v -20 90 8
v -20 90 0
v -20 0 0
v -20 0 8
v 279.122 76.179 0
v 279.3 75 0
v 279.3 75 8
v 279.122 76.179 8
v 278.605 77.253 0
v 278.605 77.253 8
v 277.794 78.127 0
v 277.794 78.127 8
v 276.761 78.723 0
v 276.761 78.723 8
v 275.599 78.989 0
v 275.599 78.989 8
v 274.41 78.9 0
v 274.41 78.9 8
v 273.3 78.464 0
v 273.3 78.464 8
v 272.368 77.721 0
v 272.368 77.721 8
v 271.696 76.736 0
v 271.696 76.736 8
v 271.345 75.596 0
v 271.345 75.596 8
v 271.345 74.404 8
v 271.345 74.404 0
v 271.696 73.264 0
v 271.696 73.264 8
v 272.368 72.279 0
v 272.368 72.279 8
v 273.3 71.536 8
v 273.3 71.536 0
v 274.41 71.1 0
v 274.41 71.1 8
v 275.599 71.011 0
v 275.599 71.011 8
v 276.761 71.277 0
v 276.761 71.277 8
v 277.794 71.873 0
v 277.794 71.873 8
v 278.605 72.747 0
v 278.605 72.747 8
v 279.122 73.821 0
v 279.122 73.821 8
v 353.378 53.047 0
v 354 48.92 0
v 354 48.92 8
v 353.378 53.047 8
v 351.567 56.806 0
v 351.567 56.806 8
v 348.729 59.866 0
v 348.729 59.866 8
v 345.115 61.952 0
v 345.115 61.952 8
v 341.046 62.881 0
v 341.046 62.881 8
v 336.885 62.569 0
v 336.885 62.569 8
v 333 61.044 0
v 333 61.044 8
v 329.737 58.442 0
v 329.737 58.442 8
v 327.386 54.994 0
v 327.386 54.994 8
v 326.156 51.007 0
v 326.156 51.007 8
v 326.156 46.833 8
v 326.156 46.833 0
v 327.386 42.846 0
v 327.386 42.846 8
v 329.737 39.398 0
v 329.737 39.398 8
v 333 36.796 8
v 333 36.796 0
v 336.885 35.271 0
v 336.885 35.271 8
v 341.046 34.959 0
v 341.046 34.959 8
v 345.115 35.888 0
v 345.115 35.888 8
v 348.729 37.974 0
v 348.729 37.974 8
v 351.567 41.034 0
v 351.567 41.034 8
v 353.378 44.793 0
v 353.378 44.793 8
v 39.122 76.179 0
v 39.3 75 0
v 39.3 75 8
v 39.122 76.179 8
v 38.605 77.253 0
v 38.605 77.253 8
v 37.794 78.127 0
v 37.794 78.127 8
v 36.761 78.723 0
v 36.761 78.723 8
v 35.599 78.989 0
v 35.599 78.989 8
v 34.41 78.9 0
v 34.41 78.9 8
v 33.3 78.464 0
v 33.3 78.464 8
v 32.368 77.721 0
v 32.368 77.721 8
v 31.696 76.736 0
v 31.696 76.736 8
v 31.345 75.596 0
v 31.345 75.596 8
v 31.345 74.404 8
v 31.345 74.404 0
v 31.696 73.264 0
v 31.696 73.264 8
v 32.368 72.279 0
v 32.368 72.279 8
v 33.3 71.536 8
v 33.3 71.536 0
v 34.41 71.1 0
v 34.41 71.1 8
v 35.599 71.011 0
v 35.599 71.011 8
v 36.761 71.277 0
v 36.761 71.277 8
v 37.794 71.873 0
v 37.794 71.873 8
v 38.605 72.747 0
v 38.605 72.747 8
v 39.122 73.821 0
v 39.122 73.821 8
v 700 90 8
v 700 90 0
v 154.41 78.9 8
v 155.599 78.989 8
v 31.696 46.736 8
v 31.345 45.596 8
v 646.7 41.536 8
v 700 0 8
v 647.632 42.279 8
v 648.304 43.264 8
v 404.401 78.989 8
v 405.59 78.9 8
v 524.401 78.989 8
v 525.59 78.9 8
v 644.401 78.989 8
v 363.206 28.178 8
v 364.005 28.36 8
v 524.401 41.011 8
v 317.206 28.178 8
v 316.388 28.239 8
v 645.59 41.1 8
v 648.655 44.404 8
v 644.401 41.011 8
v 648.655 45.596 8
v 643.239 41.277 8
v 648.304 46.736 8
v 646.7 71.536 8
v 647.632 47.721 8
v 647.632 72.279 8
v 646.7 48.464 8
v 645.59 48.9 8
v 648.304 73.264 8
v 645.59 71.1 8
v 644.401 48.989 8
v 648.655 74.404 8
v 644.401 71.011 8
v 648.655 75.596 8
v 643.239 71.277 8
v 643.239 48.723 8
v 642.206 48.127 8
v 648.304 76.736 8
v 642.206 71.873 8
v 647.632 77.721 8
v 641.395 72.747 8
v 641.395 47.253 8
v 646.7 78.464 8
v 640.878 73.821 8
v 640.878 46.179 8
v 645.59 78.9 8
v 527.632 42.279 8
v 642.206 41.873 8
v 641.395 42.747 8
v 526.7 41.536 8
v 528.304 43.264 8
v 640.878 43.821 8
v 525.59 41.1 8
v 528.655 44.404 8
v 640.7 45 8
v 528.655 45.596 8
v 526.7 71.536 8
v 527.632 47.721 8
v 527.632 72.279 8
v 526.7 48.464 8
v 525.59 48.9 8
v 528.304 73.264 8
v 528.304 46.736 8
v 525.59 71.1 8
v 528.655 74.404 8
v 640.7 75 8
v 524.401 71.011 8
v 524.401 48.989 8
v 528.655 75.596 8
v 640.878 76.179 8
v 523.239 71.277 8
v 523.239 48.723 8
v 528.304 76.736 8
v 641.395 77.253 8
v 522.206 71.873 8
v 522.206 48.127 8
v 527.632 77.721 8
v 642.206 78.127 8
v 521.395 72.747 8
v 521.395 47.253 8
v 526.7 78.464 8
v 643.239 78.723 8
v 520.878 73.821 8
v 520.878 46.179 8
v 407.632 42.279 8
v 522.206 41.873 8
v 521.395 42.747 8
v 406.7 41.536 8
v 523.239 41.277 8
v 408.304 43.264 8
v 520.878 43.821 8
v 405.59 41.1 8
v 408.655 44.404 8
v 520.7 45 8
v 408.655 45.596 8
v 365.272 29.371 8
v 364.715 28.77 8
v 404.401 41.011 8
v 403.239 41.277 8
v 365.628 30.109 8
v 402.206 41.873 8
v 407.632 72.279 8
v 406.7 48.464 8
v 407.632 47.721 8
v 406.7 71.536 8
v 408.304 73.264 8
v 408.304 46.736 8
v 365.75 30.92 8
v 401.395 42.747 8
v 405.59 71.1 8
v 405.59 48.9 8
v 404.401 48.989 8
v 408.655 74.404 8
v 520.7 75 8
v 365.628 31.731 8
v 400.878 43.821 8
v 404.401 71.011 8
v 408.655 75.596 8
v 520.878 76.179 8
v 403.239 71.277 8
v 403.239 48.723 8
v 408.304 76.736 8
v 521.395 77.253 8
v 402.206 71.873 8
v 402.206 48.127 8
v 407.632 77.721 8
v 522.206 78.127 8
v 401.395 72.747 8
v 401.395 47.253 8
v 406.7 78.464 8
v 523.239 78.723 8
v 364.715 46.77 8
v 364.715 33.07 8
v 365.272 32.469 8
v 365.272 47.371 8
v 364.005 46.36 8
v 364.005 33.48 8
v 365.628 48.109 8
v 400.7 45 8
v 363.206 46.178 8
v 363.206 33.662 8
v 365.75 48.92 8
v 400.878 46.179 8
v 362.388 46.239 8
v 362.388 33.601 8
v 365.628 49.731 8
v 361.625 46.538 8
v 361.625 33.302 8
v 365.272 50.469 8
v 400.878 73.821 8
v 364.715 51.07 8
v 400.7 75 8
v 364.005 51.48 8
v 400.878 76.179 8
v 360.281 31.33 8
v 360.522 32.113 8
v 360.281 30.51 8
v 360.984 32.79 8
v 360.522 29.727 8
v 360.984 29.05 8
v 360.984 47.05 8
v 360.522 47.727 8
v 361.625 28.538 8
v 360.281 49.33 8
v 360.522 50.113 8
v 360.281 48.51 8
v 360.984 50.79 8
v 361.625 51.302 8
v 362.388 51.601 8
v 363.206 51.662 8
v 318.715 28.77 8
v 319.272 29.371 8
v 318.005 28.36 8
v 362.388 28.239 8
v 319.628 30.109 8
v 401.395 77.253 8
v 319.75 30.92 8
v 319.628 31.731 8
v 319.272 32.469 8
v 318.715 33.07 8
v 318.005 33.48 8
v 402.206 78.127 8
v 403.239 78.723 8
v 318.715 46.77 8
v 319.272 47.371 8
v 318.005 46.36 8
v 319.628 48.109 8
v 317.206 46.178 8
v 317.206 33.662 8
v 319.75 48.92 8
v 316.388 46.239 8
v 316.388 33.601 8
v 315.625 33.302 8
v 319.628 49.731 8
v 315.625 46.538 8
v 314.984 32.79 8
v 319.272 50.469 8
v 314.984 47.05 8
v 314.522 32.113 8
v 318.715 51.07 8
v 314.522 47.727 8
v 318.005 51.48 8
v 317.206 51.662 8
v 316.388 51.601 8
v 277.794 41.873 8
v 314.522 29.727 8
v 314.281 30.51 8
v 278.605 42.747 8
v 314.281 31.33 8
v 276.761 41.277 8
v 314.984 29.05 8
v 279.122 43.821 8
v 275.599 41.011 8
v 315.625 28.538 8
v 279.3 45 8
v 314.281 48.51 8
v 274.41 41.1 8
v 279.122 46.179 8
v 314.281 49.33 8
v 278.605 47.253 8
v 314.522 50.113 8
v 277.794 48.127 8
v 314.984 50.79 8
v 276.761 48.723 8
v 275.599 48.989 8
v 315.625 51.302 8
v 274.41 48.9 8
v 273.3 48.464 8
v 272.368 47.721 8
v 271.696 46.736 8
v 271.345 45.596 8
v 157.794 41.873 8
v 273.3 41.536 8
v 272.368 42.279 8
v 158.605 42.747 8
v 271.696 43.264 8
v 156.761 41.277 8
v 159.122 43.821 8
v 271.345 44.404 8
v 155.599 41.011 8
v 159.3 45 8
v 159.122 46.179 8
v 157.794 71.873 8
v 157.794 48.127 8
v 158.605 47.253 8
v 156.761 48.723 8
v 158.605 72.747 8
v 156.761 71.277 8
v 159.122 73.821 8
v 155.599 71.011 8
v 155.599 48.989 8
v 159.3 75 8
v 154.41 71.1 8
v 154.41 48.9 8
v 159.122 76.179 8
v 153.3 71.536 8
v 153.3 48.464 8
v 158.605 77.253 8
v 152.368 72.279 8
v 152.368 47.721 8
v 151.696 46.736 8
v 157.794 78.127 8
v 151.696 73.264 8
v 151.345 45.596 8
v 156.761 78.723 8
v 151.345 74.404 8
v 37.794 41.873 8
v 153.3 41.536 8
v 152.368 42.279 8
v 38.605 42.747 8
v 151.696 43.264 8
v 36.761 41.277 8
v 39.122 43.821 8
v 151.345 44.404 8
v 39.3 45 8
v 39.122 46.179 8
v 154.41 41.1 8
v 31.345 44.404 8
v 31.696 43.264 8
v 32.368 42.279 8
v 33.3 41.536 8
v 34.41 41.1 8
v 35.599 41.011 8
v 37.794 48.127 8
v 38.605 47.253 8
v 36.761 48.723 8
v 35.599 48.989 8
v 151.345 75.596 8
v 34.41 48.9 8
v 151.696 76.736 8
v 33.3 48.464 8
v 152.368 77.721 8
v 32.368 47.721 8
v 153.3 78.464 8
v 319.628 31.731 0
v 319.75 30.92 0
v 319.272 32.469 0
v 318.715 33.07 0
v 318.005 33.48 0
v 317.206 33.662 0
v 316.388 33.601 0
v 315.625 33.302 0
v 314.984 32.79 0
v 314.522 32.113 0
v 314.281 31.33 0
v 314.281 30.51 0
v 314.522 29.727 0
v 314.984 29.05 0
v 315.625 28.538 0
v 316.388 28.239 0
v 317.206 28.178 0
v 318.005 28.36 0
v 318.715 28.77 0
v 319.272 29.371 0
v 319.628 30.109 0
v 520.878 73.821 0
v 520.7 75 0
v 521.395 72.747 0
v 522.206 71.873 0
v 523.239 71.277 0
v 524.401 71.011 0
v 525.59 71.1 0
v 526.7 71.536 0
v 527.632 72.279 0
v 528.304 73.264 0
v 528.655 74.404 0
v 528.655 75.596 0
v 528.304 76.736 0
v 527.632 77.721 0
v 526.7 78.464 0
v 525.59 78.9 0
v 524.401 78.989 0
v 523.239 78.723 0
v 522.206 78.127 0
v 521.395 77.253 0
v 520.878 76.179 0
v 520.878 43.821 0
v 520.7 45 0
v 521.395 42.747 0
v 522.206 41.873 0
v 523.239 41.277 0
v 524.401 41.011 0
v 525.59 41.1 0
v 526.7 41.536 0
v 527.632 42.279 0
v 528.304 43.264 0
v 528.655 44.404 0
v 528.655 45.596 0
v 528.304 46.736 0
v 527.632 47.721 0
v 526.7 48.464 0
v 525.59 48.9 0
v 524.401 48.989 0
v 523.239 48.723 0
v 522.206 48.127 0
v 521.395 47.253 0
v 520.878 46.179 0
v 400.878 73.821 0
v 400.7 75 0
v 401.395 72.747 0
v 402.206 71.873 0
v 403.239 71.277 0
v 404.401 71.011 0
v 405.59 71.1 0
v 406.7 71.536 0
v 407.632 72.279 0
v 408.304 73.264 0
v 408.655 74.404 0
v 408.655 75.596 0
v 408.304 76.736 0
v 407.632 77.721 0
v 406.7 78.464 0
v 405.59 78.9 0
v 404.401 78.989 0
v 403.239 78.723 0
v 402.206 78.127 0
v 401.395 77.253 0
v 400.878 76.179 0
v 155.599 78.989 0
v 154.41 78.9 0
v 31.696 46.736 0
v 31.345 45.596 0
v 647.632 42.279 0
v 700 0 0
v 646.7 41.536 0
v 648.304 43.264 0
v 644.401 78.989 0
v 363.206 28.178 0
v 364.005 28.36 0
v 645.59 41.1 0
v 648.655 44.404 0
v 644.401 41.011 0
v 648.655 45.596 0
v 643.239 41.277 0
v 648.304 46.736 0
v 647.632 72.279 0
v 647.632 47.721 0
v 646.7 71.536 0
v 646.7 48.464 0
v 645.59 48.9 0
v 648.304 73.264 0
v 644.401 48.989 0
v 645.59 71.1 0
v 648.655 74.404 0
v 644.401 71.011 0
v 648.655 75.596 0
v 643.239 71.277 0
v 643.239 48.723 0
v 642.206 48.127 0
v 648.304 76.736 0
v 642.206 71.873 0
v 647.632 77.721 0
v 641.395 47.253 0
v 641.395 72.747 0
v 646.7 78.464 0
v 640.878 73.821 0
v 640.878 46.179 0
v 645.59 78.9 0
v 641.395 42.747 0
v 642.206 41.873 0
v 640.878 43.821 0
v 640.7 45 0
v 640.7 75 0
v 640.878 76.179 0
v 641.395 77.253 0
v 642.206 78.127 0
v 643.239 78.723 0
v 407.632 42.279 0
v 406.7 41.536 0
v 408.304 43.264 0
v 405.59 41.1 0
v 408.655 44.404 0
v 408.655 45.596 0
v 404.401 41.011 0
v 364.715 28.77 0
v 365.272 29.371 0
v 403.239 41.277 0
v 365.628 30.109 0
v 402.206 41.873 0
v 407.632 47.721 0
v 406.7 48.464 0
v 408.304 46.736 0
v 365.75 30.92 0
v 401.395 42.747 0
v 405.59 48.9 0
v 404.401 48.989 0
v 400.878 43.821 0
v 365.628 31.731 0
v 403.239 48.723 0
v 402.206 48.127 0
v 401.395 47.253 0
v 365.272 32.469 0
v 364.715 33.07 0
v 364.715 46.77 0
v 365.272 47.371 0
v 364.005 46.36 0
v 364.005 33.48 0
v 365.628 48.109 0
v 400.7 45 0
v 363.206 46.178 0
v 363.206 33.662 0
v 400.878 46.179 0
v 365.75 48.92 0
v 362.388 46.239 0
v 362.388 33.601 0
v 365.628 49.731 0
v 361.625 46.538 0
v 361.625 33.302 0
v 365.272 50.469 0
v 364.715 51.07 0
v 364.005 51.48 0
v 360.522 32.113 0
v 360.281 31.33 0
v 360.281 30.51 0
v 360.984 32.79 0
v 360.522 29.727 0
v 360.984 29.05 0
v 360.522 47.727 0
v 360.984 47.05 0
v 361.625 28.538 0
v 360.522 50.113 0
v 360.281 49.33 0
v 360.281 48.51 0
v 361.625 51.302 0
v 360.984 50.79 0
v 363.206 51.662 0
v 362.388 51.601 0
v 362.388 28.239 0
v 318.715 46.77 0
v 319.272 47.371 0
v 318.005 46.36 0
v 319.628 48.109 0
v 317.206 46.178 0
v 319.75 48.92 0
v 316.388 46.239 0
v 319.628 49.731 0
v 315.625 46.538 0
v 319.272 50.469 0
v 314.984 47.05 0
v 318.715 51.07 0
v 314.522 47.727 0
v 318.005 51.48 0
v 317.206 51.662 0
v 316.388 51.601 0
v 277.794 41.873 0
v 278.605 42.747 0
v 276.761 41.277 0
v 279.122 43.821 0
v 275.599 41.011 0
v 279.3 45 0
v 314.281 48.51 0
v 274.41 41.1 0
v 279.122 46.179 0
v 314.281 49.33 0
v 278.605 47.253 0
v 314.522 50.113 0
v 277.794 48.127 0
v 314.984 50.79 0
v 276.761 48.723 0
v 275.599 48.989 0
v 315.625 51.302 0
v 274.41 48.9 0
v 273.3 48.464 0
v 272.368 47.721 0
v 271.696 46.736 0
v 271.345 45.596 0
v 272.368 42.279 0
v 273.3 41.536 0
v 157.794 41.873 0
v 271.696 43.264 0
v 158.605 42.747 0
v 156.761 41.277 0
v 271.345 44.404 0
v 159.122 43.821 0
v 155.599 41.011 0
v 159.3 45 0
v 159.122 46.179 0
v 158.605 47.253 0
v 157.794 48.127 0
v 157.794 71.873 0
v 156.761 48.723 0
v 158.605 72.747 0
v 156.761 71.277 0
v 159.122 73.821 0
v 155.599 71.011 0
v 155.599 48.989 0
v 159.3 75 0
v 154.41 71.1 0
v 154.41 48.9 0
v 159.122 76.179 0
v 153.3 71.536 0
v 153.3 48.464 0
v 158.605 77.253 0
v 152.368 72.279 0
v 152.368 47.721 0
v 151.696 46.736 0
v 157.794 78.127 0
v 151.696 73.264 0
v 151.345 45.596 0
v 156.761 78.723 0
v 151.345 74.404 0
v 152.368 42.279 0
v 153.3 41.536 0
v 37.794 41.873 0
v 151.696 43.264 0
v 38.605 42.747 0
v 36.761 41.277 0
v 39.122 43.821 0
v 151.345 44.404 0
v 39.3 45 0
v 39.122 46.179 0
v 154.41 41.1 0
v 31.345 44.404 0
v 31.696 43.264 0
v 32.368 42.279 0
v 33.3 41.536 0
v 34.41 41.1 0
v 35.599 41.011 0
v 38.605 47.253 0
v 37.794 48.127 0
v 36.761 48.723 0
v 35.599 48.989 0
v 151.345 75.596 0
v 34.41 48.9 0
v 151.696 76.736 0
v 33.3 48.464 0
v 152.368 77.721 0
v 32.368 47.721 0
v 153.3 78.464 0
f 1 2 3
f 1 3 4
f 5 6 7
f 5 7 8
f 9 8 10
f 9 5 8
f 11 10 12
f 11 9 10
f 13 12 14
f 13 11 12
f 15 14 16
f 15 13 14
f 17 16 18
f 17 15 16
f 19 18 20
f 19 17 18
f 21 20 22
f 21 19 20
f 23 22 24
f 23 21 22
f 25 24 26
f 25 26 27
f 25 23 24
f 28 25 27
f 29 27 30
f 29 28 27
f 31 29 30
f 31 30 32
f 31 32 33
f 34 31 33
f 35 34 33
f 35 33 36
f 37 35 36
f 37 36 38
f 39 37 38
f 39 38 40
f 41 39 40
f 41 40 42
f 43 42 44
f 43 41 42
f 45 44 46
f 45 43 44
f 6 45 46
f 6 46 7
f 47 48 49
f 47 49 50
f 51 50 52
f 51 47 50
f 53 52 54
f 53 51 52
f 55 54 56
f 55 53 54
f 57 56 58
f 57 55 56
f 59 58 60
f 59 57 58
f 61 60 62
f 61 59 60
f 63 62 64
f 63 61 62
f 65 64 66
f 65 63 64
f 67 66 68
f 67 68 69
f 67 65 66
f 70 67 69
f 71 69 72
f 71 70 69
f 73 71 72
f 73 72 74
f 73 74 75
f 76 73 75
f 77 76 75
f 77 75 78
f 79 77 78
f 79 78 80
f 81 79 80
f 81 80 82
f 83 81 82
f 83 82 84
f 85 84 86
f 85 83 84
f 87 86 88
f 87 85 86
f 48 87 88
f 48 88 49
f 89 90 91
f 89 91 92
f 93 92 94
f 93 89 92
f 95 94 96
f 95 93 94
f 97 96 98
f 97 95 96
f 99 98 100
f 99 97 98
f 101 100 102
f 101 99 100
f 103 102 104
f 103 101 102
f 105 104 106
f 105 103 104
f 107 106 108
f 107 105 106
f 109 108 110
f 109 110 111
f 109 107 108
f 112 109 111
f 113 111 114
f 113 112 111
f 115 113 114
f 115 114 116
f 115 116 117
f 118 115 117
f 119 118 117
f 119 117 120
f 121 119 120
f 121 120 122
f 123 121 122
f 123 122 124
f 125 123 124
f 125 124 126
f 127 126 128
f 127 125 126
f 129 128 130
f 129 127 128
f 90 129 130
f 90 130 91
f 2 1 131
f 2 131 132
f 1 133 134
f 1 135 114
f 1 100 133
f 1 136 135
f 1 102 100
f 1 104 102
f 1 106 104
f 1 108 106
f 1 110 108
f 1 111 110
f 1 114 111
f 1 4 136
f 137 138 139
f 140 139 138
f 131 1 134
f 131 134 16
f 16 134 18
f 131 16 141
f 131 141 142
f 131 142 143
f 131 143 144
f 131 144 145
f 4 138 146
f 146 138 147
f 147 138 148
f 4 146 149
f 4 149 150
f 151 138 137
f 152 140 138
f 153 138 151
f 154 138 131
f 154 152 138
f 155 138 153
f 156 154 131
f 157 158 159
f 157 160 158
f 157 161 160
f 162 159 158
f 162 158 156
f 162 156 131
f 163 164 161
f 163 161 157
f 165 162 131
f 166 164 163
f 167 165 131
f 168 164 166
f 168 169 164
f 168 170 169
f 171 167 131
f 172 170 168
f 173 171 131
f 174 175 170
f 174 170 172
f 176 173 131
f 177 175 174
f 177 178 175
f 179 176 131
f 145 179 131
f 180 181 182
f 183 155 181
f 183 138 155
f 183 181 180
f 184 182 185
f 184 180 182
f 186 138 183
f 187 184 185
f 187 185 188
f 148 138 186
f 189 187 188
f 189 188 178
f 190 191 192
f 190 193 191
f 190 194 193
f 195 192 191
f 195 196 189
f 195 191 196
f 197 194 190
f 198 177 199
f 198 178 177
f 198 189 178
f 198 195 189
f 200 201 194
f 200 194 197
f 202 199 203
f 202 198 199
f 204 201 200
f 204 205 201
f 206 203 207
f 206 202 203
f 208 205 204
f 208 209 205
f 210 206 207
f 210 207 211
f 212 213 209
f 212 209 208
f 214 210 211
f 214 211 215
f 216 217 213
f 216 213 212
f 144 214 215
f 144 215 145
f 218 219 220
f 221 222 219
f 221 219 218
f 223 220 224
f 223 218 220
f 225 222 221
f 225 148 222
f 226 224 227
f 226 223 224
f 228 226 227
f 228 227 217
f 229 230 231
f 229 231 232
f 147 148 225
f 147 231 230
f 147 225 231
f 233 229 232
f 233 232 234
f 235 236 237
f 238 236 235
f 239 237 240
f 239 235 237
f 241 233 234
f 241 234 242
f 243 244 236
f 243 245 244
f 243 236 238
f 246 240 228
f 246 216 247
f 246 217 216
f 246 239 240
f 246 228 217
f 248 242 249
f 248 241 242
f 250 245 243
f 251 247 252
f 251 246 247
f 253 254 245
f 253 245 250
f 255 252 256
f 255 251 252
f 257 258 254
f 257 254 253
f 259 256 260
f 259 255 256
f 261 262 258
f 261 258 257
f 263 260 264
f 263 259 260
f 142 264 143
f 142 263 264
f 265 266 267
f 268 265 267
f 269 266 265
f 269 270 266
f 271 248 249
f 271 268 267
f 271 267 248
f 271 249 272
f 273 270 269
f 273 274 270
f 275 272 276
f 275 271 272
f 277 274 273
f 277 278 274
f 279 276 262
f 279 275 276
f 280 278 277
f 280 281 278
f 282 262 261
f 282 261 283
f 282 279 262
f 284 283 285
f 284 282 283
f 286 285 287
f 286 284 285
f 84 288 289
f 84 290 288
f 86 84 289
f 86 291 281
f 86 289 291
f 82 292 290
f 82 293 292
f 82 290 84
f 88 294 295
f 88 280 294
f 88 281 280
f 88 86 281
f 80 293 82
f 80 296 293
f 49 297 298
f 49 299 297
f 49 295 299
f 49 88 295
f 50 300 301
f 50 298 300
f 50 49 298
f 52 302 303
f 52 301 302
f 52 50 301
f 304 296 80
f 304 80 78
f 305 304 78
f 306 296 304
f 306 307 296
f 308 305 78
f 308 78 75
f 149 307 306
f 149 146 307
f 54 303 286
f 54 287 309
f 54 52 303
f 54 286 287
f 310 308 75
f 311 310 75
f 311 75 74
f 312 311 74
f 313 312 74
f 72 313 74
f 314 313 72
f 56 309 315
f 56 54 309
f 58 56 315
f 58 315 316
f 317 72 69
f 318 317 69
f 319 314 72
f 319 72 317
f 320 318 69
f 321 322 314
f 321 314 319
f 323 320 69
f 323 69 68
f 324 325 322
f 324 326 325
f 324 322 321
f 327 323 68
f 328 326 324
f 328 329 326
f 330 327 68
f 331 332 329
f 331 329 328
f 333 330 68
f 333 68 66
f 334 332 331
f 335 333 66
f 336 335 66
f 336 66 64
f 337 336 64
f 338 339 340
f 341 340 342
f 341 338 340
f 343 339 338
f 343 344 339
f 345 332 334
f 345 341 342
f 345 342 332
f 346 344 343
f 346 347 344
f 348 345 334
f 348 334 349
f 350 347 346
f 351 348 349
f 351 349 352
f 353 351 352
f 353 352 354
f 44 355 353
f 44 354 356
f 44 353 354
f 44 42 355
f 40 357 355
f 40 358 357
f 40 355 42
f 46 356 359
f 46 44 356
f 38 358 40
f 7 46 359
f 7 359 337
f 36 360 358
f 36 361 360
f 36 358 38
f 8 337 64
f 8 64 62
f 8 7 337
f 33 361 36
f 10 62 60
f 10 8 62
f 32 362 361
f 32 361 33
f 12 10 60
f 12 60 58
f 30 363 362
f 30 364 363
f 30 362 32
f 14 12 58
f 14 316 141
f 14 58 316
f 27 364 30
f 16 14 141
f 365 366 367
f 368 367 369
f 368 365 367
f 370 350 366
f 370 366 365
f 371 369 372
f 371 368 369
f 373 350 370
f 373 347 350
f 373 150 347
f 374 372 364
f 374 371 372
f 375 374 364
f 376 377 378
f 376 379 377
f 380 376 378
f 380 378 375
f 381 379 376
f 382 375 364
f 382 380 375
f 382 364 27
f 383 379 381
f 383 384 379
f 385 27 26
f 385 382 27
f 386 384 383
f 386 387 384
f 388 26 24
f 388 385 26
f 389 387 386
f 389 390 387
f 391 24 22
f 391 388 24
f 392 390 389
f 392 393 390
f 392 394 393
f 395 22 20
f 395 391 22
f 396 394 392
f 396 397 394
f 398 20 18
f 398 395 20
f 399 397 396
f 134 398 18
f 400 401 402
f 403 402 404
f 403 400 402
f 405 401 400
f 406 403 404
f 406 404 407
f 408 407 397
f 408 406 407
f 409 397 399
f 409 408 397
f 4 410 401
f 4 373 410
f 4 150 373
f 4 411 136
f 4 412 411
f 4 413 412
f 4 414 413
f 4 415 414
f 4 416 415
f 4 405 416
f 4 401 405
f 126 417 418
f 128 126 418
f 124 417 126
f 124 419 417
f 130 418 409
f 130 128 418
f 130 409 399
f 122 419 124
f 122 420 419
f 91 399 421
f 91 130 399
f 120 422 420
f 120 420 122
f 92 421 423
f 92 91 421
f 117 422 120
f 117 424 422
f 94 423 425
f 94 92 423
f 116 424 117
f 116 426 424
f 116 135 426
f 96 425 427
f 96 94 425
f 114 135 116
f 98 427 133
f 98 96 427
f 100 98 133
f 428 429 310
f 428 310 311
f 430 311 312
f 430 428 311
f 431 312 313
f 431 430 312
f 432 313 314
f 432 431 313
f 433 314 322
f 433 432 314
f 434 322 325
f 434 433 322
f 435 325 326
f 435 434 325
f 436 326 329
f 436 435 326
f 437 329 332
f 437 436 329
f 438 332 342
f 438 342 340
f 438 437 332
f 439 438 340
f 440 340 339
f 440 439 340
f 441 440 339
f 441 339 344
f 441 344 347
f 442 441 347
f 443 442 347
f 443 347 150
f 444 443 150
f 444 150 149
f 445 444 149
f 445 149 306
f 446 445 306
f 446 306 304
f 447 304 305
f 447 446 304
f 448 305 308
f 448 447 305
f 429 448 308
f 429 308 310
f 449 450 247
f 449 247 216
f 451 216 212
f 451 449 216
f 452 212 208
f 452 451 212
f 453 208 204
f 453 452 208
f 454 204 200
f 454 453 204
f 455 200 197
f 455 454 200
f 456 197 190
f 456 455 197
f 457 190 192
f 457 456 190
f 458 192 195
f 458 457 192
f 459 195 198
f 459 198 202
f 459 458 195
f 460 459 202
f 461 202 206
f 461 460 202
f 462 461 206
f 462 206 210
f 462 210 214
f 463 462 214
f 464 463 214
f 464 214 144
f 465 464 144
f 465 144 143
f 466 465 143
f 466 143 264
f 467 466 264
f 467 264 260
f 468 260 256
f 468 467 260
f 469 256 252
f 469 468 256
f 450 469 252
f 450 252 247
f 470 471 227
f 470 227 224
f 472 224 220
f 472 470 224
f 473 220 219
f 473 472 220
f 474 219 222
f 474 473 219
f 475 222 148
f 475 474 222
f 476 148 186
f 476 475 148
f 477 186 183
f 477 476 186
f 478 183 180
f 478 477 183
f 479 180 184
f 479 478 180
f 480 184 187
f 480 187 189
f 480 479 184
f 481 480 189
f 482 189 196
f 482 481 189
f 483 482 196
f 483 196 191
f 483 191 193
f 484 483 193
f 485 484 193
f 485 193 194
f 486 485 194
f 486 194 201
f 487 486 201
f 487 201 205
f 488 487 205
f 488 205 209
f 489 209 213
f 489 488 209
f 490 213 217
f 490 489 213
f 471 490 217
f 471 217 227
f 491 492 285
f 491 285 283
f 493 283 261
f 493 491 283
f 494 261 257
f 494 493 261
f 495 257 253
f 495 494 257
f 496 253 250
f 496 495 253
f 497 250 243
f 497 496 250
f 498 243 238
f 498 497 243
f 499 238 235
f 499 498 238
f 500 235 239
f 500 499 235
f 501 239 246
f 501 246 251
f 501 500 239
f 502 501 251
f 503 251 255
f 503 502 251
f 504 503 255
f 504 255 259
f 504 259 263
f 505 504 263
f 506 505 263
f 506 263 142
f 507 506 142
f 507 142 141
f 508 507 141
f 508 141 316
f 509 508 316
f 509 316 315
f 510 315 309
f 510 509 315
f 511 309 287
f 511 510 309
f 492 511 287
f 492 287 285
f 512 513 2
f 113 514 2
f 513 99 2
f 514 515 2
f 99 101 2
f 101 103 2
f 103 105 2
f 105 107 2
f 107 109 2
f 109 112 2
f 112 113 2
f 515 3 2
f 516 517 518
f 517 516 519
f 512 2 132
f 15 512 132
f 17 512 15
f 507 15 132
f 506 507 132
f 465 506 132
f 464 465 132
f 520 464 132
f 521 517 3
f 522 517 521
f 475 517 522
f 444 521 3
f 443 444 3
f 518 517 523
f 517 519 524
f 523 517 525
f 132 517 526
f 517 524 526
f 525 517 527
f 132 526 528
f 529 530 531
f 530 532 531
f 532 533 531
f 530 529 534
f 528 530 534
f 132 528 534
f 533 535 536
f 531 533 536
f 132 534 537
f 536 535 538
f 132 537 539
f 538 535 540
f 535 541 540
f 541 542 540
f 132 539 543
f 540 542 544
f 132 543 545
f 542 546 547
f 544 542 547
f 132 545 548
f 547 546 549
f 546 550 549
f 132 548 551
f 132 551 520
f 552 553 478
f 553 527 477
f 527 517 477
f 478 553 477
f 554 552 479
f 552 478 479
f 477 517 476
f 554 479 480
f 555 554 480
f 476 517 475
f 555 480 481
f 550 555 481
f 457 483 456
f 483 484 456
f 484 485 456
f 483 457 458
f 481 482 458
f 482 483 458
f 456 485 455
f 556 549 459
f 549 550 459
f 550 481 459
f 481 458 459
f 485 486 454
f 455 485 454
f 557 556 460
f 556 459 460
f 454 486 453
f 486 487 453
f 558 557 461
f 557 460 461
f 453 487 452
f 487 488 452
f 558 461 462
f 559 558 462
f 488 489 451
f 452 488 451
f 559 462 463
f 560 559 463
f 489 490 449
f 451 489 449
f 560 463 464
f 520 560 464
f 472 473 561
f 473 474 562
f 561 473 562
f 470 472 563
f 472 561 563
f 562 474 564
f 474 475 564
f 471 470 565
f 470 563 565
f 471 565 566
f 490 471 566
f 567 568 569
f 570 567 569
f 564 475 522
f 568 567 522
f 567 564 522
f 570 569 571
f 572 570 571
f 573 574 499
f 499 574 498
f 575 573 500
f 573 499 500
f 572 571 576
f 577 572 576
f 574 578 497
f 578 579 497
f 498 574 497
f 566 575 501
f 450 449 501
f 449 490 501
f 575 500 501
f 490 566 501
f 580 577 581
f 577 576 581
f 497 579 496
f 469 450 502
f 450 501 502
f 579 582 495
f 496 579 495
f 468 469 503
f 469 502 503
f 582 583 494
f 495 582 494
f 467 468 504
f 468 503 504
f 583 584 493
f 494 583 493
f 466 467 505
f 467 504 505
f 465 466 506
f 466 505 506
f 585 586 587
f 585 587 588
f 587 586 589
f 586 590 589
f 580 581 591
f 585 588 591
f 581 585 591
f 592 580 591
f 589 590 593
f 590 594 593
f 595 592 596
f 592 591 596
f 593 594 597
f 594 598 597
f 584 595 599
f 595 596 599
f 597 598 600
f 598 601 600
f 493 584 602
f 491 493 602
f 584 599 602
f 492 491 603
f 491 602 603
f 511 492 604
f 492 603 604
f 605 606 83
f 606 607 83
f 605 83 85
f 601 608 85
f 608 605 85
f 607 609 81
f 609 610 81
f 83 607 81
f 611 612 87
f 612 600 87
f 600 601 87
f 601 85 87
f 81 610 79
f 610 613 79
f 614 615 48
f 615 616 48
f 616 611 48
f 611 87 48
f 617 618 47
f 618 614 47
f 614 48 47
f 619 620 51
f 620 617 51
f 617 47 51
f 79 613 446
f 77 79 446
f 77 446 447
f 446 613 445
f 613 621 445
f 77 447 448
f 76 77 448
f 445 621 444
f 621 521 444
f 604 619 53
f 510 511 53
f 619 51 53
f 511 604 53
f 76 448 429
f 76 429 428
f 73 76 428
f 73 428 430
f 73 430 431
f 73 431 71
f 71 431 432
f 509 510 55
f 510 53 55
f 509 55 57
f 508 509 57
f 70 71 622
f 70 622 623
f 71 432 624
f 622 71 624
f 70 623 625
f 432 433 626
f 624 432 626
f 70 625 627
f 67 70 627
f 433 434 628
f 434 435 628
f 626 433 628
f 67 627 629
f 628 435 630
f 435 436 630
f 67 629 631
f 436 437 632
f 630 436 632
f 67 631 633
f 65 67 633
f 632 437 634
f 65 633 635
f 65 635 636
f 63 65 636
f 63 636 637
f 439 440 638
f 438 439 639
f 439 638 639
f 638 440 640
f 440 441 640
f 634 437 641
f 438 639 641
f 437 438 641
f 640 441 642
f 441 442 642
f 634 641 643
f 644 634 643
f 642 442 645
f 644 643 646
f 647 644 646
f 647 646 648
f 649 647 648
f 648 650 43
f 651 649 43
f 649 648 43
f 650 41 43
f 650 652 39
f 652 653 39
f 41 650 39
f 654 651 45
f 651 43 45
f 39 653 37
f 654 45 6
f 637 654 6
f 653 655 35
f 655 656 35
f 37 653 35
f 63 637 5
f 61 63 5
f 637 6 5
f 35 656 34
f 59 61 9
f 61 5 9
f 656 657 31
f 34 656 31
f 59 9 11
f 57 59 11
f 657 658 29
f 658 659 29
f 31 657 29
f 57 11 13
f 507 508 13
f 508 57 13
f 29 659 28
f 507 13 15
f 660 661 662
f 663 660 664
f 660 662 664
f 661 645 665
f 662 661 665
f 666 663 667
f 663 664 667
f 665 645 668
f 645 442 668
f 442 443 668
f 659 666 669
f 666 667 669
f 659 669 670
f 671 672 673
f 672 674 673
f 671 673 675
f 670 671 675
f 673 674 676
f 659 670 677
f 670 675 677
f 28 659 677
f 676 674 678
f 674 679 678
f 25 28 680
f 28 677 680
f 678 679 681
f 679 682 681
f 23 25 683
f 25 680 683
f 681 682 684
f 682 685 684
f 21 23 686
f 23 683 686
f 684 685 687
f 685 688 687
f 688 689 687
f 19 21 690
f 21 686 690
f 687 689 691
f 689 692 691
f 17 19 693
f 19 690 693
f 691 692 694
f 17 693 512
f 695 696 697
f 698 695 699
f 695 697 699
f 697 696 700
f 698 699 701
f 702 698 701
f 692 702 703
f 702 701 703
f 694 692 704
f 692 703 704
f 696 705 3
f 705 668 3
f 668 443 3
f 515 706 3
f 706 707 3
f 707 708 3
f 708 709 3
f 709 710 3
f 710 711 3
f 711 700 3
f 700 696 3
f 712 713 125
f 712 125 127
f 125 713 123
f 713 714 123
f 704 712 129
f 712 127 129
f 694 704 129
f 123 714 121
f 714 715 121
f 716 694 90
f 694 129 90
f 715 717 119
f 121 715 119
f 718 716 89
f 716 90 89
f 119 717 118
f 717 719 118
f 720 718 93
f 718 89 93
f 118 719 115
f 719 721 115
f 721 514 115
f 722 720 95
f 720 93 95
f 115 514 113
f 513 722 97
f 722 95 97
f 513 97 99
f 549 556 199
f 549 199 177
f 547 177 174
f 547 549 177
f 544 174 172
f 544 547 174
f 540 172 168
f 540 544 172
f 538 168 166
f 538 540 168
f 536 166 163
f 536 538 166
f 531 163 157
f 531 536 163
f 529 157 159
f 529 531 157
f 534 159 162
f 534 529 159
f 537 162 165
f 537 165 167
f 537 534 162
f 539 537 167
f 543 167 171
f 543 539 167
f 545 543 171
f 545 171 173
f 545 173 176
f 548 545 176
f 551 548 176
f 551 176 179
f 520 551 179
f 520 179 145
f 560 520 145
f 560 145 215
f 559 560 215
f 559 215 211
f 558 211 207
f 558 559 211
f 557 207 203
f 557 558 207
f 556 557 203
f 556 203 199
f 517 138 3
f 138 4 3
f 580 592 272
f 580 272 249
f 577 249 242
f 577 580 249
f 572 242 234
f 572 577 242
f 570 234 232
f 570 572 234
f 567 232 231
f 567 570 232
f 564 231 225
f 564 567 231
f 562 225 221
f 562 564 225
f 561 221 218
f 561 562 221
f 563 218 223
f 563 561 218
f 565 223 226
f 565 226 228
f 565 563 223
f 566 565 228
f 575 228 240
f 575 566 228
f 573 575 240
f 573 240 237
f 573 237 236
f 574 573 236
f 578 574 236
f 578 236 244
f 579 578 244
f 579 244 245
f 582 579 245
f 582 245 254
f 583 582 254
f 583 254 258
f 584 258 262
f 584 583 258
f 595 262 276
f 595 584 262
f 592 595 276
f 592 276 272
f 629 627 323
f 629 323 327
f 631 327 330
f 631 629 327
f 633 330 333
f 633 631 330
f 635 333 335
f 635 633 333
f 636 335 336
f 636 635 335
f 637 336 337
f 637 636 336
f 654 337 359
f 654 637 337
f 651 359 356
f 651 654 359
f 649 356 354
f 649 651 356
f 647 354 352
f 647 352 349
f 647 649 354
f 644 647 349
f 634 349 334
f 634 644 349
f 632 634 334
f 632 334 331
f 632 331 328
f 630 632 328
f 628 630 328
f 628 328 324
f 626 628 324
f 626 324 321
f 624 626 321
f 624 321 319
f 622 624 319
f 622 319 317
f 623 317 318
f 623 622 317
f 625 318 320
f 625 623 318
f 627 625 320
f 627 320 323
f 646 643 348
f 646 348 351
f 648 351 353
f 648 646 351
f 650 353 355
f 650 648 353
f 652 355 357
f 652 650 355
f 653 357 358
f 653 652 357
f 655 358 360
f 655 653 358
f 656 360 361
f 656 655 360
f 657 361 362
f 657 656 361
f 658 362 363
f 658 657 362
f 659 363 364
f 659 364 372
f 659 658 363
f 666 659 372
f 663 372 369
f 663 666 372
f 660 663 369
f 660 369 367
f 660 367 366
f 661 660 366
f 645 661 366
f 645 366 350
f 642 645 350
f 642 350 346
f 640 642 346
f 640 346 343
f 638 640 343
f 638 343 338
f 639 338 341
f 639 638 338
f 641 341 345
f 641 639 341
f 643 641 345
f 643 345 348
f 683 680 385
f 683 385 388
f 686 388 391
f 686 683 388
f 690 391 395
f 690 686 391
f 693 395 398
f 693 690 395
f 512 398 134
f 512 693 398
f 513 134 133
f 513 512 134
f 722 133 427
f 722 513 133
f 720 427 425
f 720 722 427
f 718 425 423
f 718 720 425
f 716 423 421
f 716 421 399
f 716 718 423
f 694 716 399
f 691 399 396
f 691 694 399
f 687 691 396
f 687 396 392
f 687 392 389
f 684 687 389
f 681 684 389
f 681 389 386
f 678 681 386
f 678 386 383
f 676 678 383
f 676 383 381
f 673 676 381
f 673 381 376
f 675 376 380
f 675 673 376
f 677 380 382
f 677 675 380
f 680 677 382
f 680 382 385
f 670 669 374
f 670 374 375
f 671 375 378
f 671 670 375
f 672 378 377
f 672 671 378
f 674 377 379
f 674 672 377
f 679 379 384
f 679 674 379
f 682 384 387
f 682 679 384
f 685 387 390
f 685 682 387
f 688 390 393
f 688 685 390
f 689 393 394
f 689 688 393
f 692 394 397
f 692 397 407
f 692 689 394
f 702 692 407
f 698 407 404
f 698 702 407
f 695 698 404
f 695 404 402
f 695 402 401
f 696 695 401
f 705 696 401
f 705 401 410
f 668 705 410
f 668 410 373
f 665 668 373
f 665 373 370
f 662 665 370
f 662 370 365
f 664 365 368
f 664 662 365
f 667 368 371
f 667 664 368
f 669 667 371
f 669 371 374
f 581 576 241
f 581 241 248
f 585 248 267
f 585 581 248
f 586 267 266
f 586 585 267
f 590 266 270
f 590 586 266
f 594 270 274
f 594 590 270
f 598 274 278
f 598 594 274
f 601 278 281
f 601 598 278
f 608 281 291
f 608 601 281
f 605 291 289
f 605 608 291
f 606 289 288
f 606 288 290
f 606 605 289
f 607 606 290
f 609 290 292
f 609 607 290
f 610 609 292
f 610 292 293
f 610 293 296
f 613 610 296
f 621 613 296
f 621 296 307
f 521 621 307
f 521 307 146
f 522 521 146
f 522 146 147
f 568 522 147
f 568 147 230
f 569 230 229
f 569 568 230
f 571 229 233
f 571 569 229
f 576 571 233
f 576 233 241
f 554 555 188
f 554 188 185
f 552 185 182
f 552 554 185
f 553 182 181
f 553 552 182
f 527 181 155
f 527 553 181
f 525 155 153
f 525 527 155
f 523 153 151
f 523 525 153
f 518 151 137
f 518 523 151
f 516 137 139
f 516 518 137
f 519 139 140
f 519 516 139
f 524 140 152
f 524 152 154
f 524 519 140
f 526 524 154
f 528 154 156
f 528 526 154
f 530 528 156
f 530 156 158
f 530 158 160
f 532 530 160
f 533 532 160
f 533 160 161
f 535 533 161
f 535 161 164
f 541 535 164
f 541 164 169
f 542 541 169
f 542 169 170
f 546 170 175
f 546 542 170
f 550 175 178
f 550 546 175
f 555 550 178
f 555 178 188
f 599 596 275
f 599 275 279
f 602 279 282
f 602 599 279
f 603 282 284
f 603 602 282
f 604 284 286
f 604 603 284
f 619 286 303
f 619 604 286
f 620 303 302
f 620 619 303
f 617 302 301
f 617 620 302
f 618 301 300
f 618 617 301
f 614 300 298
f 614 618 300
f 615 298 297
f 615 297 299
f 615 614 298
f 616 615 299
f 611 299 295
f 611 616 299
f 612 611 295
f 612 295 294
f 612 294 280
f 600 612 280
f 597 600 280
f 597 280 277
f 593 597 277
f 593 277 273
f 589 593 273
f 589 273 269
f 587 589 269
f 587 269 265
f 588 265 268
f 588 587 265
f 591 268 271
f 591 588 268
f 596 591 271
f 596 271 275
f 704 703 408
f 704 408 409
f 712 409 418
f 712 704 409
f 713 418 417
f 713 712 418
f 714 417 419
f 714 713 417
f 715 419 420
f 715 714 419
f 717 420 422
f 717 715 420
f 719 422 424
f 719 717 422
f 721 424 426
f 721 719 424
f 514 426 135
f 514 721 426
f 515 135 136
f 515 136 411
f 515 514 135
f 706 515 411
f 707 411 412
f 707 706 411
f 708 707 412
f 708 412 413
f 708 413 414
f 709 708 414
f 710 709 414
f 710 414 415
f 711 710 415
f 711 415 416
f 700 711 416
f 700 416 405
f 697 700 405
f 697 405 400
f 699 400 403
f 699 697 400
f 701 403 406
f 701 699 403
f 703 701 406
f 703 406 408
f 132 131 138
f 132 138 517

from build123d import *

# Parameters (mm, degrees)
ESQUISSE1_W        = 680
ESQUISSE1_H        = 90
ESQUISSE1_R        = 2.75
ESQUISSE1_R_2      = 14
ESQUISSE1_R_3      = 4
BOSS_EXTRU_1_DEPTH = 8
ESQUISSE2_W        = 8
ESQUISSE2_H        = 90
BOSS_EXTRU_2_DEPTH = 20
ESQUISSE3_W        = 8
ESQUISSE3_H        = 90
BOSS_EXTRU_3_DEPTH = 20


with BuildPart() as part:
    # Esquisse1 → Boss.-Extru.1 (new body)
    with BuildSketch(Plane.XY):
        with Locations((340, 45)):
            Rectangle(ESQUISSE1_W, ESQUISSE1_H)
        with Locations((317, 48.92)):
            Circle(ESQUISSE1_R, mode=Mode.SUBTRACT)
        with Locations((363, 48.92)):
            Circle(ESQUISSE1_R, mode=Mode.SUBTRACT)
        with Locations((363, 30.92)):
            Circle(ESQUISSE1_R, mode=Mode.SUBTRACT)
        with Locations((317, 30.92)):
            Circle(ESQUISSE1_R, mode=Mode.SUBTRACT)
        with Locations((340, 48.92)):
            Circle(ESQUISSE1_R_2, mode=Mode.SUBTRACT)
        with Locations((35.3, 75)):
            Circle(ESQUISSE1_R_3, mode=Mode.SUBTRACT)
        with Locations((35.3, 45)):
            Circle(ESQUISSE1_R_3, mode=Mode.SUBTRACT)
        with Locations(Location((644.7, 45, 0), (0, 0, 180))):
            Circle(ESQUISSE1_R_3, mode=Mode.SUBTRACT)
        with Locations(Location((644.7, 75, 0), (0, 0, 180))):
            Circle(ESQUISSE1_R_3, mode=Mode.SUBTRACT)
        with Locations((155.3, 75)):
            Circle(ESQUISSE1_R_3, mode=Mode.SUBTRACT)
        with Locations((155.3, 45)):
            Circle(ESQUISSE1_R_3, mode=Mode.SUBTRACT)
        with Locations((275.3, 75)):
            Circle(ESQUISSE1_R_3, mode=Mode.SUBTRACT)
        with Locations((275.3, 45)):
            Circle(ESQUISSE1_R_3, mode=Mode.SUBTRACT)
        with Locations(Location((404.7, 45, 0), (0, 0, 180))):
            Circle(ESQUISSE1_R_3, mode=Mode.SUBTRACT)
        with Locations(Location((404.7, 75, 0), (0, 0, 180))):
            Circle(ESQUISSE1_R_3, mode=Mode.SUBTRACT)
        with Locations(Location((524.7, 45, 0), (0, 0, 180))):
            Circle(ESQUISSE1_R_3, mode=Mode.SUBTRACT)
        with Locations(Location((524.7, 75, 0), (0, 0, 180))):
            Circle(ESQUISSE1_R_3, mode=Mode.SUBTRACT)
    extrude(amount=BOSS_EXTRU_1_DEPTH)

    # Esquisse2 → Boss.-Extru.2 (add)
    with BuildSketch(Plane.ZY):
        with Locations((4, 45)):
            Rectangle(ESQUISSE2_W, ESQUISSE2_H)
    extrude(amount=BOSS_EXTRU_2_DEPTH)

    # Esquisse3 → Boss.-Extru.3 (add)
    with BuildSketch(Plane(origin=(680, 0, 0), x_dir=(0, 0, -1), z_dir=(1, 0, 0))):
        with Locations((-4, 45)):
            Rectangle(ESQUISSE3_W, ESQUISSE3_H)
    extrude(amount=BOSS_EXTRU_3_DEPTH)


solid = part.part
